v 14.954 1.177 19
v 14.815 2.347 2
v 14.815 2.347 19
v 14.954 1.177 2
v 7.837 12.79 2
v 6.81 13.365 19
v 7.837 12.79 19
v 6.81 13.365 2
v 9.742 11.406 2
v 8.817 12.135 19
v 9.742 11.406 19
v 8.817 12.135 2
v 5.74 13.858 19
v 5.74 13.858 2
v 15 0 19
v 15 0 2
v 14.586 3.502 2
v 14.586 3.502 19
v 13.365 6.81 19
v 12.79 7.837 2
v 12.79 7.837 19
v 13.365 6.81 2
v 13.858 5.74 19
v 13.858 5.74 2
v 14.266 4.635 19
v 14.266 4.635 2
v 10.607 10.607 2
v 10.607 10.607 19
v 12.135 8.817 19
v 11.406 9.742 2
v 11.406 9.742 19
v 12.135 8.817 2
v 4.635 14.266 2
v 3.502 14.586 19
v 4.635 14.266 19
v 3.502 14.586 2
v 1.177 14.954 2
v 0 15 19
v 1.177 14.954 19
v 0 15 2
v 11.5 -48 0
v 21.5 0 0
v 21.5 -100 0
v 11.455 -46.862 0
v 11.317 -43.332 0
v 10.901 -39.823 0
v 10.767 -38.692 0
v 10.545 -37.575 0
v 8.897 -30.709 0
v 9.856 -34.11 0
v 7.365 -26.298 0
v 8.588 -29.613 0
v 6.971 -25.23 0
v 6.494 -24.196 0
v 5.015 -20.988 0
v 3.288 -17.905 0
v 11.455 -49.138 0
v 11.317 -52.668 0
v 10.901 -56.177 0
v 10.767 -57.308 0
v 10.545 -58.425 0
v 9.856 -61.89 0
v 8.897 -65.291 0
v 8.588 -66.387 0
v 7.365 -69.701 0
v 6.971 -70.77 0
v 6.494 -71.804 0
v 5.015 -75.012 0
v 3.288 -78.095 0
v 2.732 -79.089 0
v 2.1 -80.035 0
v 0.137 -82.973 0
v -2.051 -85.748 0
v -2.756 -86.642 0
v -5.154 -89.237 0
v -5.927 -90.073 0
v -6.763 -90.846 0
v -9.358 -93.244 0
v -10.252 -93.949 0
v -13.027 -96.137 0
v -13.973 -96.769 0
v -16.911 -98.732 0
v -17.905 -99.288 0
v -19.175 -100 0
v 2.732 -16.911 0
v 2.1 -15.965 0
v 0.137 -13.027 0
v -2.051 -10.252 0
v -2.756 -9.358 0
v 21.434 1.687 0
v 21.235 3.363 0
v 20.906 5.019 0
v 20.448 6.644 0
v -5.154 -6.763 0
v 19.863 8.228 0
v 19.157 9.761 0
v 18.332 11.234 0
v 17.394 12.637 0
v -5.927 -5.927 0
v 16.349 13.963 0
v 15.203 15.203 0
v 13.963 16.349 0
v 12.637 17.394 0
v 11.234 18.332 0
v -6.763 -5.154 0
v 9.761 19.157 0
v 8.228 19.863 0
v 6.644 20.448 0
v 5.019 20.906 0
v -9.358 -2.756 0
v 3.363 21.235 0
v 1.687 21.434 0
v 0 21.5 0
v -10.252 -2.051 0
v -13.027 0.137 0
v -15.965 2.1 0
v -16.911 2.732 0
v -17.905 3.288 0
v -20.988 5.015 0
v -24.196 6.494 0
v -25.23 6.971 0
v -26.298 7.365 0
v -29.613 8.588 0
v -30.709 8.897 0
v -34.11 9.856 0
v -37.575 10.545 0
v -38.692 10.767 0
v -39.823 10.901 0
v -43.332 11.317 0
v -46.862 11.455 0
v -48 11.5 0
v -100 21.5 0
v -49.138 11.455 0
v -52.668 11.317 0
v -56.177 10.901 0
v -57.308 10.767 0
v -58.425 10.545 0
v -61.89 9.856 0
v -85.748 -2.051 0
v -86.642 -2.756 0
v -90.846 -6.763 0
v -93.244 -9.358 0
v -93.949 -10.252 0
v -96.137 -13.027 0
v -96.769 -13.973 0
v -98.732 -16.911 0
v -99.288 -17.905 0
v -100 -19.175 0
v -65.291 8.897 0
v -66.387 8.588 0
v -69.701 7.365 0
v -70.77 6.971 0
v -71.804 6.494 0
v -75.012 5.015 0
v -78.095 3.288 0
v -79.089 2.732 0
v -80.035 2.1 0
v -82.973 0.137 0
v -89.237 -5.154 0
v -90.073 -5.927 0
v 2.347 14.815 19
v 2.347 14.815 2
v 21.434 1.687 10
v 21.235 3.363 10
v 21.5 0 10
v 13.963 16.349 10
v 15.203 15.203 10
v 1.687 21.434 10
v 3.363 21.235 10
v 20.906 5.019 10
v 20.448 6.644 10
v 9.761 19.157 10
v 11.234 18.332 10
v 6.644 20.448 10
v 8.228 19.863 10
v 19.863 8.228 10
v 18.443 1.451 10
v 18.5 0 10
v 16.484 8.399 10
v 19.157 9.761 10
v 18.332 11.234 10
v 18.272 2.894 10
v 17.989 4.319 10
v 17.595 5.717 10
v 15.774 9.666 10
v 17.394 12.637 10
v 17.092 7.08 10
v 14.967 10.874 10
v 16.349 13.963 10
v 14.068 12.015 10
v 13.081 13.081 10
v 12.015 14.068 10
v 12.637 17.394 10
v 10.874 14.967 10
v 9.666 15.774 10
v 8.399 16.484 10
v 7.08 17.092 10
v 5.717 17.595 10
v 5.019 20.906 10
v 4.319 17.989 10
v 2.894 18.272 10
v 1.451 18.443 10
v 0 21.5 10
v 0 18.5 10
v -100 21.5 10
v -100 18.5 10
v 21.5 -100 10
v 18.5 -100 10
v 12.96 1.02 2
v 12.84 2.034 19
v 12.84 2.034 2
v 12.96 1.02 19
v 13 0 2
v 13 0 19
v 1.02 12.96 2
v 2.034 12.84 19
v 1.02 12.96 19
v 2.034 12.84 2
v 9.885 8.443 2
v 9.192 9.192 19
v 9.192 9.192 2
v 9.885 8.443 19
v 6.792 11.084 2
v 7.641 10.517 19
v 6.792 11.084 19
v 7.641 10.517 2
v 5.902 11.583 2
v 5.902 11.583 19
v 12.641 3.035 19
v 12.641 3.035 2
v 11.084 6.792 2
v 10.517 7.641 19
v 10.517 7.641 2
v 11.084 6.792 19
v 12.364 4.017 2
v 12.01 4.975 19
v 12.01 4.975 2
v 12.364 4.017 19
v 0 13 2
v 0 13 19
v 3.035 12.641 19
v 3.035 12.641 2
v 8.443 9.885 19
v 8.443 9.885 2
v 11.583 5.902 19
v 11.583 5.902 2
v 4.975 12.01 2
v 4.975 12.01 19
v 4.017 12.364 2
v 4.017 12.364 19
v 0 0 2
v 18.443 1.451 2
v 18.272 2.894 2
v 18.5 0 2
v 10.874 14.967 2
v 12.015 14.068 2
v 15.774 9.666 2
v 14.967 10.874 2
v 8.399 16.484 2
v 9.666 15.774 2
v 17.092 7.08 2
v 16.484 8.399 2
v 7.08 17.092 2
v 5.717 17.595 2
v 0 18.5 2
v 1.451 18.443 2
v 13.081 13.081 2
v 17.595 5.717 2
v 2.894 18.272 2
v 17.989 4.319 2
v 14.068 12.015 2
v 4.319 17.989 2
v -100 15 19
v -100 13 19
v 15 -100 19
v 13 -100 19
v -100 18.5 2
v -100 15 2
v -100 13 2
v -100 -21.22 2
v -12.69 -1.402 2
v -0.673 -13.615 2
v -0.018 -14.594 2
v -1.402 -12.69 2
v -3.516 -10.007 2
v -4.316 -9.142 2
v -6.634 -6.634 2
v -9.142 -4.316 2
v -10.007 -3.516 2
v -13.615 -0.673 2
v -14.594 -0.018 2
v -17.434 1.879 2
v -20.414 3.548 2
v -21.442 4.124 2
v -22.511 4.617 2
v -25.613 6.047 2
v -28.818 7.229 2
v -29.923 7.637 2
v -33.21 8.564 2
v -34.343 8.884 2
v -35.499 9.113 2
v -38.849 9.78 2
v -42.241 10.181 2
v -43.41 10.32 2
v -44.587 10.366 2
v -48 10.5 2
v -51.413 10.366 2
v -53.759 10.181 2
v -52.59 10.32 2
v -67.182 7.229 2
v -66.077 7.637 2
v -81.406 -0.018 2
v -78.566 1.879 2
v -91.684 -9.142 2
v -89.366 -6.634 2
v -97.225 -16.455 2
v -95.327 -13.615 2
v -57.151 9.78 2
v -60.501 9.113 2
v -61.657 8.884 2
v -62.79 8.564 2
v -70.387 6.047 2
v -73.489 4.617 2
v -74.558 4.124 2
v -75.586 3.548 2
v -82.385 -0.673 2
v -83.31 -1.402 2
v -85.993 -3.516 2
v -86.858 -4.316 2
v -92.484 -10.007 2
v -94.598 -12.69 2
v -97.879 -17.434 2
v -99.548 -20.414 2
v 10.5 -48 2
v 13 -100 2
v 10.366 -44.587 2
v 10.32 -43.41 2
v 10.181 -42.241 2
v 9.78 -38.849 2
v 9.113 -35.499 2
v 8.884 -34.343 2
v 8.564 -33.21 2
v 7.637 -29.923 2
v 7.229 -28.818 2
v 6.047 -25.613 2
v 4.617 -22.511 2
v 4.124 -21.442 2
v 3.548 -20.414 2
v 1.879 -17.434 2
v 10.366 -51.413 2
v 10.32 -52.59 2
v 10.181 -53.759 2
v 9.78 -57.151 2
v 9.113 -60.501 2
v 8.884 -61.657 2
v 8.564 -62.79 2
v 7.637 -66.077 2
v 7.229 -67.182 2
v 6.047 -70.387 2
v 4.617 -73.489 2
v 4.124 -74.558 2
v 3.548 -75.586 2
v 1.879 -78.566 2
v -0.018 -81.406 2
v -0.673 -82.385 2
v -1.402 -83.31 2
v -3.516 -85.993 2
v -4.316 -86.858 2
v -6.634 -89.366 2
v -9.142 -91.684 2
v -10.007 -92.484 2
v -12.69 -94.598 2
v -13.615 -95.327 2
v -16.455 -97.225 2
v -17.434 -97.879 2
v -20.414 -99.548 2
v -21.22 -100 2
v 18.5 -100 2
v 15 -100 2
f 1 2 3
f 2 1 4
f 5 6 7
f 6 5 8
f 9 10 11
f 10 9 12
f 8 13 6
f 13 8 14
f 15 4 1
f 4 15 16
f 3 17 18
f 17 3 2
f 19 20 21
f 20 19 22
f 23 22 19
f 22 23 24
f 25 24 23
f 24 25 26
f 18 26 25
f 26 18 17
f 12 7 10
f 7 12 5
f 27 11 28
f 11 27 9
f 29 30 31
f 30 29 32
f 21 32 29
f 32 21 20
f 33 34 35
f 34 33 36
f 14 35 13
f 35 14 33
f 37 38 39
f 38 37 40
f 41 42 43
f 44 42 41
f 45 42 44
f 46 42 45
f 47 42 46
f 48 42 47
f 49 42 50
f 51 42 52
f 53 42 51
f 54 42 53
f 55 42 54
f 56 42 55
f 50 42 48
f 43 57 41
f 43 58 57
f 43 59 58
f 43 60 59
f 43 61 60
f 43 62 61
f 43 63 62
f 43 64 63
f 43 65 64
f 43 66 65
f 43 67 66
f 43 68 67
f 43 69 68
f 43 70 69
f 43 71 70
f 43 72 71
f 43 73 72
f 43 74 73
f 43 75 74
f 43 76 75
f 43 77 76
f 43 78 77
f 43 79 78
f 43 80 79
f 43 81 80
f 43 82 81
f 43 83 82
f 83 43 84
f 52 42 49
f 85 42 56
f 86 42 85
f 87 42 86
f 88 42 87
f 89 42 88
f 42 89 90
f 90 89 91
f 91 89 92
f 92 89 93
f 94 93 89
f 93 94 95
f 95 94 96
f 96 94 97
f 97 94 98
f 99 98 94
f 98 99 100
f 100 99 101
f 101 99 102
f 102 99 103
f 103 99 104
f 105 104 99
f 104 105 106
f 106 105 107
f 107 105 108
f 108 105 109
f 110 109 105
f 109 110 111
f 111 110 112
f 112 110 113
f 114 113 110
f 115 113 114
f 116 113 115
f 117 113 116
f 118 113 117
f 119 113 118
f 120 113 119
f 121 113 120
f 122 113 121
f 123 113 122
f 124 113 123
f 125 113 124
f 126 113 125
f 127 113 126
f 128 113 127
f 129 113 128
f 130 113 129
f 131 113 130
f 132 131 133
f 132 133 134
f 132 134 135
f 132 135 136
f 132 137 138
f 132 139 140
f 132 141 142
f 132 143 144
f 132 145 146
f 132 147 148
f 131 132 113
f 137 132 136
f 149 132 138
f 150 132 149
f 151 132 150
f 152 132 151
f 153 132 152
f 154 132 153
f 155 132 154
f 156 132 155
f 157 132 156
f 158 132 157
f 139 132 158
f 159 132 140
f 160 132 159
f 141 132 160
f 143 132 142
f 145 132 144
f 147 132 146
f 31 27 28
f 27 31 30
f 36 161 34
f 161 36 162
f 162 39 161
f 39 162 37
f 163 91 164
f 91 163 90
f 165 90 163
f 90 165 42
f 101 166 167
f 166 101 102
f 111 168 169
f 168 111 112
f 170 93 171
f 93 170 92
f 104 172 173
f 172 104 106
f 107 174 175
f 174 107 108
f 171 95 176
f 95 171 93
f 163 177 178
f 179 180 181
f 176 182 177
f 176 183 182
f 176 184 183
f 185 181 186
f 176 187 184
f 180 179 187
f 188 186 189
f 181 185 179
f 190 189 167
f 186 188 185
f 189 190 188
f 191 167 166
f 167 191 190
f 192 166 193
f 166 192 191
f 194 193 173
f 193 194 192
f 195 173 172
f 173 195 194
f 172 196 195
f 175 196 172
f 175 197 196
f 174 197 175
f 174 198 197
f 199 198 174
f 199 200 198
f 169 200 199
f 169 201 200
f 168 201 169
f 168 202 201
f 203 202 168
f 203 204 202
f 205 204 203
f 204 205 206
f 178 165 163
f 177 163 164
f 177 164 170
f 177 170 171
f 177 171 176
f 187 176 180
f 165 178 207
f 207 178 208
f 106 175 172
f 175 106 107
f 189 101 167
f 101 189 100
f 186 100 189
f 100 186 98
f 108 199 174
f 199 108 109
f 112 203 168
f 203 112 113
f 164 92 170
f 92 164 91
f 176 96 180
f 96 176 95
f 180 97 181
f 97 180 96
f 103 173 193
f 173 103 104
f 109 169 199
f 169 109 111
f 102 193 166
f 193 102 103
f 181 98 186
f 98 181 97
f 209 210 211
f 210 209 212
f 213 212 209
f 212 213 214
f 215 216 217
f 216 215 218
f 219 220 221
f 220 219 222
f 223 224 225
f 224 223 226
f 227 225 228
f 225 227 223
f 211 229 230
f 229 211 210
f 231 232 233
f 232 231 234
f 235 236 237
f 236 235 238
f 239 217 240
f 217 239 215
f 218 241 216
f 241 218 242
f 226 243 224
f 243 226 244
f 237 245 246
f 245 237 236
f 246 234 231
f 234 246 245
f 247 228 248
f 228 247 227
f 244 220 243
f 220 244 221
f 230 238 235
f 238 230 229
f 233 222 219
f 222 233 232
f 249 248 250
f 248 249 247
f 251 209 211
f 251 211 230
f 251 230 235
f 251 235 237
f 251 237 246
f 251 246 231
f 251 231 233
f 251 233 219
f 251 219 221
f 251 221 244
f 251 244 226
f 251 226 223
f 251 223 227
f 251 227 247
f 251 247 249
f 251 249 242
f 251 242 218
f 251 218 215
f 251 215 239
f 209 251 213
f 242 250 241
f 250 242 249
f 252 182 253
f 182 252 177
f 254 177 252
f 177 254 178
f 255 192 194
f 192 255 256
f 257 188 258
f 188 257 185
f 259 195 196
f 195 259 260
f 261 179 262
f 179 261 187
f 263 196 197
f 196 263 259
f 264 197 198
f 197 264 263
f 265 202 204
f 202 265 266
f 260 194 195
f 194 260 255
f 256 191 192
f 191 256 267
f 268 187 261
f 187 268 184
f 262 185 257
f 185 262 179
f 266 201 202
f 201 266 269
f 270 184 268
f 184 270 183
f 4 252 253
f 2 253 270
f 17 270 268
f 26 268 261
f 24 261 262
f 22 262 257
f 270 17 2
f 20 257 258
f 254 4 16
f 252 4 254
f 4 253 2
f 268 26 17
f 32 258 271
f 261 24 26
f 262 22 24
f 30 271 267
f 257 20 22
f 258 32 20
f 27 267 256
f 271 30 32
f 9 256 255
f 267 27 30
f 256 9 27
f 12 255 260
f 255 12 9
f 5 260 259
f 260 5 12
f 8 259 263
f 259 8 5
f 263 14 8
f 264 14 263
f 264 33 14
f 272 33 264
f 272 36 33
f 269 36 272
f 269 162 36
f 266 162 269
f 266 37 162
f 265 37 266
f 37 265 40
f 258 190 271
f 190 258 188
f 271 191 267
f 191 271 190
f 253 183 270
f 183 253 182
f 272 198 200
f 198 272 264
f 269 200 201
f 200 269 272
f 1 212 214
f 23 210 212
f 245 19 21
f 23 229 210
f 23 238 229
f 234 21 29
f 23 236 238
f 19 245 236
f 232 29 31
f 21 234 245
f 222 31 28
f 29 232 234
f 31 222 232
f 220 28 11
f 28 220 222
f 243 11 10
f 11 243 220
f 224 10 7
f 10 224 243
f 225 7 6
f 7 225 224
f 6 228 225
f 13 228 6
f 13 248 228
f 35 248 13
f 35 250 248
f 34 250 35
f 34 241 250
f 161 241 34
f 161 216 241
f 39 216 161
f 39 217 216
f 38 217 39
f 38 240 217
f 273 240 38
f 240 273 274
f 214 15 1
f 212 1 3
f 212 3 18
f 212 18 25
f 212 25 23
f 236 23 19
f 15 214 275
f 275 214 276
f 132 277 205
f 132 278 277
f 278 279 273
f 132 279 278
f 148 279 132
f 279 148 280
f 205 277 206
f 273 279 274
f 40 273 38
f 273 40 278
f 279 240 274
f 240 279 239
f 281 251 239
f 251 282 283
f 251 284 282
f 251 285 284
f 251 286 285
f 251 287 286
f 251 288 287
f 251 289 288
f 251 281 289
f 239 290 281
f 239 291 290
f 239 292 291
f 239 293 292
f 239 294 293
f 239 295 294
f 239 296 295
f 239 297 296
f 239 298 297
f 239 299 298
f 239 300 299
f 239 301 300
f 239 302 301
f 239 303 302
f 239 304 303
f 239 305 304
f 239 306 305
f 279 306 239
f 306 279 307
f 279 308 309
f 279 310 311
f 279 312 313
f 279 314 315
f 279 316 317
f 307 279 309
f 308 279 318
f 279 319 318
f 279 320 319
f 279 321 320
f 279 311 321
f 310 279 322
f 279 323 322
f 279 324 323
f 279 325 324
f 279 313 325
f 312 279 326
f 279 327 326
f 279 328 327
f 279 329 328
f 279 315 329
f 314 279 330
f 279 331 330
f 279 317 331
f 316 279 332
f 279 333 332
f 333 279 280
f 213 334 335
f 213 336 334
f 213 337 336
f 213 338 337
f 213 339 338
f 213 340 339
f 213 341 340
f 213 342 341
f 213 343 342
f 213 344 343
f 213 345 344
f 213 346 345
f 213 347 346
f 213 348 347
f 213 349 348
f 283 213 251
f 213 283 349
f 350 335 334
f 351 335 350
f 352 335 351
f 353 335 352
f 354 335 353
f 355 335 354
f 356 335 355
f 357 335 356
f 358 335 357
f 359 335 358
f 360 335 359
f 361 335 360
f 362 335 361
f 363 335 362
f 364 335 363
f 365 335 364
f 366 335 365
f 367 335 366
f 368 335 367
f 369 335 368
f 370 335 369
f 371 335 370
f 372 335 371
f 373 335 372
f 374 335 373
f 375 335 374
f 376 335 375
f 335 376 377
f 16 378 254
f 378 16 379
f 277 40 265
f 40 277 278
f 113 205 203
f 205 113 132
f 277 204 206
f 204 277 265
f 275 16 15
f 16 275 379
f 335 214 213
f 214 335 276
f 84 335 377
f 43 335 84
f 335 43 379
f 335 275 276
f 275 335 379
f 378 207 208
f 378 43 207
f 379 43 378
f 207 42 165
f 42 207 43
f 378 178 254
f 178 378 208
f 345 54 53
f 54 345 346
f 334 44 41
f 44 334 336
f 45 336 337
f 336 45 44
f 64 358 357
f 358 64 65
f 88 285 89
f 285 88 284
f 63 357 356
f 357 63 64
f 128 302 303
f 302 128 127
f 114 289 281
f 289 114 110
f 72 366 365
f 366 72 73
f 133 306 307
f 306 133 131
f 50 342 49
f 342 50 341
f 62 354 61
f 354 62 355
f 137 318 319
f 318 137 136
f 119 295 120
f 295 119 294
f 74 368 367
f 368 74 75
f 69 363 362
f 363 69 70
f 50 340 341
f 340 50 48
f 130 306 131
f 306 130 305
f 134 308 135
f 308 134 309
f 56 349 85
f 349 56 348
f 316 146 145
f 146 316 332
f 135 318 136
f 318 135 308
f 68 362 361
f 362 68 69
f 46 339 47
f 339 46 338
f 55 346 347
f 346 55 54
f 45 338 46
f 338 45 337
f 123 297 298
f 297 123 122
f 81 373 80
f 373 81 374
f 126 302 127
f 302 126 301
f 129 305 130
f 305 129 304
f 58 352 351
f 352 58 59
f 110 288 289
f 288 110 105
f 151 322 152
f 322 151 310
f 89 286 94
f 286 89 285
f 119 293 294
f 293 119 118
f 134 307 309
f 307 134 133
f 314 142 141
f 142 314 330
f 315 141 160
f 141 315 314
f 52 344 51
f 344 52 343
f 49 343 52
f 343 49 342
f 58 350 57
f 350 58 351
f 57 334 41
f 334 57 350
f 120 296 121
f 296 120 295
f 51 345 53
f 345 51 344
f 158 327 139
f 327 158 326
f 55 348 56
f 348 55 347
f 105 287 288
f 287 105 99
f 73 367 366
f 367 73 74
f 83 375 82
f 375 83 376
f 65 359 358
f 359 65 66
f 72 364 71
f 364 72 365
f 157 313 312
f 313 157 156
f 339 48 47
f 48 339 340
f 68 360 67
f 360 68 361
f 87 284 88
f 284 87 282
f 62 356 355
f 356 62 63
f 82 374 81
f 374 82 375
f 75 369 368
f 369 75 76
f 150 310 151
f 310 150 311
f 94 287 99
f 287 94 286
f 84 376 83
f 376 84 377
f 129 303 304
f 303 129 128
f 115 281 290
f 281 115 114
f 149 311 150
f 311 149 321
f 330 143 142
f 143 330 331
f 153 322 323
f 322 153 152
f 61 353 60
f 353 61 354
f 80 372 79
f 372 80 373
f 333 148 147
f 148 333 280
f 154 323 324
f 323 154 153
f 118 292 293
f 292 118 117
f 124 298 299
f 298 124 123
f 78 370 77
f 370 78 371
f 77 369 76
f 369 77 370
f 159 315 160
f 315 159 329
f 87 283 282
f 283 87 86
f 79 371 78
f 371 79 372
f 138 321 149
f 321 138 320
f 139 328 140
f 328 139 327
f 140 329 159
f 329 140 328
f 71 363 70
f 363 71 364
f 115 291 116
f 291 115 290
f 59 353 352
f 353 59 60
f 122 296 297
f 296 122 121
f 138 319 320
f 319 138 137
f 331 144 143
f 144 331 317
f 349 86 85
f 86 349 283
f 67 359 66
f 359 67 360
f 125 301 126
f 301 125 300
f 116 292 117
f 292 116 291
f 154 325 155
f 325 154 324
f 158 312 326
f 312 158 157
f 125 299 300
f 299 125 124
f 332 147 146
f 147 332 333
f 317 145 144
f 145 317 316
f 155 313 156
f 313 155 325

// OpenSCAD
$fn=80;

module bottom(r1=13,r2=15,r3=18.5,r4=21.5) {
   intersection() {
      difference() {
         difference() {
            union() {
               cylinder (r=r2,h=20);
               cylinder (r=r4,h=10);
            }
            translate([0,0,2]) cylinder (r=r1,h=31);
         }
         translate([0,0,2]) difference() {
            cylinder (r=r3,h=40);
            cylinder (r=r2,h=41);
         }
      }
      translate([0,0,-1]) cube([30,30,20],center=false);
   }
}


module moreform() {
   translate([-100,13,0]) cube([100,2,19]);
   translate([-100,13-50,0]) cube([100,8.5+50,2]);
   translate([-100,18.5,0]) cube([100,3,10]);

   translate([13,-100,0]) cube([2,100,19]);
   translate([13-50,-100,0]) cube([8.5+50,100,2]);
   translate([18.5,-100,0]) cube([3,100,10]);
}

difference() {
   union() {
      translate([0,0,0]) bottom();
      translate([0,0,0]) moreform();
   }
   translate([-48,-48,-1]) cylinder(d1=120,d2=116,h=4);
}
